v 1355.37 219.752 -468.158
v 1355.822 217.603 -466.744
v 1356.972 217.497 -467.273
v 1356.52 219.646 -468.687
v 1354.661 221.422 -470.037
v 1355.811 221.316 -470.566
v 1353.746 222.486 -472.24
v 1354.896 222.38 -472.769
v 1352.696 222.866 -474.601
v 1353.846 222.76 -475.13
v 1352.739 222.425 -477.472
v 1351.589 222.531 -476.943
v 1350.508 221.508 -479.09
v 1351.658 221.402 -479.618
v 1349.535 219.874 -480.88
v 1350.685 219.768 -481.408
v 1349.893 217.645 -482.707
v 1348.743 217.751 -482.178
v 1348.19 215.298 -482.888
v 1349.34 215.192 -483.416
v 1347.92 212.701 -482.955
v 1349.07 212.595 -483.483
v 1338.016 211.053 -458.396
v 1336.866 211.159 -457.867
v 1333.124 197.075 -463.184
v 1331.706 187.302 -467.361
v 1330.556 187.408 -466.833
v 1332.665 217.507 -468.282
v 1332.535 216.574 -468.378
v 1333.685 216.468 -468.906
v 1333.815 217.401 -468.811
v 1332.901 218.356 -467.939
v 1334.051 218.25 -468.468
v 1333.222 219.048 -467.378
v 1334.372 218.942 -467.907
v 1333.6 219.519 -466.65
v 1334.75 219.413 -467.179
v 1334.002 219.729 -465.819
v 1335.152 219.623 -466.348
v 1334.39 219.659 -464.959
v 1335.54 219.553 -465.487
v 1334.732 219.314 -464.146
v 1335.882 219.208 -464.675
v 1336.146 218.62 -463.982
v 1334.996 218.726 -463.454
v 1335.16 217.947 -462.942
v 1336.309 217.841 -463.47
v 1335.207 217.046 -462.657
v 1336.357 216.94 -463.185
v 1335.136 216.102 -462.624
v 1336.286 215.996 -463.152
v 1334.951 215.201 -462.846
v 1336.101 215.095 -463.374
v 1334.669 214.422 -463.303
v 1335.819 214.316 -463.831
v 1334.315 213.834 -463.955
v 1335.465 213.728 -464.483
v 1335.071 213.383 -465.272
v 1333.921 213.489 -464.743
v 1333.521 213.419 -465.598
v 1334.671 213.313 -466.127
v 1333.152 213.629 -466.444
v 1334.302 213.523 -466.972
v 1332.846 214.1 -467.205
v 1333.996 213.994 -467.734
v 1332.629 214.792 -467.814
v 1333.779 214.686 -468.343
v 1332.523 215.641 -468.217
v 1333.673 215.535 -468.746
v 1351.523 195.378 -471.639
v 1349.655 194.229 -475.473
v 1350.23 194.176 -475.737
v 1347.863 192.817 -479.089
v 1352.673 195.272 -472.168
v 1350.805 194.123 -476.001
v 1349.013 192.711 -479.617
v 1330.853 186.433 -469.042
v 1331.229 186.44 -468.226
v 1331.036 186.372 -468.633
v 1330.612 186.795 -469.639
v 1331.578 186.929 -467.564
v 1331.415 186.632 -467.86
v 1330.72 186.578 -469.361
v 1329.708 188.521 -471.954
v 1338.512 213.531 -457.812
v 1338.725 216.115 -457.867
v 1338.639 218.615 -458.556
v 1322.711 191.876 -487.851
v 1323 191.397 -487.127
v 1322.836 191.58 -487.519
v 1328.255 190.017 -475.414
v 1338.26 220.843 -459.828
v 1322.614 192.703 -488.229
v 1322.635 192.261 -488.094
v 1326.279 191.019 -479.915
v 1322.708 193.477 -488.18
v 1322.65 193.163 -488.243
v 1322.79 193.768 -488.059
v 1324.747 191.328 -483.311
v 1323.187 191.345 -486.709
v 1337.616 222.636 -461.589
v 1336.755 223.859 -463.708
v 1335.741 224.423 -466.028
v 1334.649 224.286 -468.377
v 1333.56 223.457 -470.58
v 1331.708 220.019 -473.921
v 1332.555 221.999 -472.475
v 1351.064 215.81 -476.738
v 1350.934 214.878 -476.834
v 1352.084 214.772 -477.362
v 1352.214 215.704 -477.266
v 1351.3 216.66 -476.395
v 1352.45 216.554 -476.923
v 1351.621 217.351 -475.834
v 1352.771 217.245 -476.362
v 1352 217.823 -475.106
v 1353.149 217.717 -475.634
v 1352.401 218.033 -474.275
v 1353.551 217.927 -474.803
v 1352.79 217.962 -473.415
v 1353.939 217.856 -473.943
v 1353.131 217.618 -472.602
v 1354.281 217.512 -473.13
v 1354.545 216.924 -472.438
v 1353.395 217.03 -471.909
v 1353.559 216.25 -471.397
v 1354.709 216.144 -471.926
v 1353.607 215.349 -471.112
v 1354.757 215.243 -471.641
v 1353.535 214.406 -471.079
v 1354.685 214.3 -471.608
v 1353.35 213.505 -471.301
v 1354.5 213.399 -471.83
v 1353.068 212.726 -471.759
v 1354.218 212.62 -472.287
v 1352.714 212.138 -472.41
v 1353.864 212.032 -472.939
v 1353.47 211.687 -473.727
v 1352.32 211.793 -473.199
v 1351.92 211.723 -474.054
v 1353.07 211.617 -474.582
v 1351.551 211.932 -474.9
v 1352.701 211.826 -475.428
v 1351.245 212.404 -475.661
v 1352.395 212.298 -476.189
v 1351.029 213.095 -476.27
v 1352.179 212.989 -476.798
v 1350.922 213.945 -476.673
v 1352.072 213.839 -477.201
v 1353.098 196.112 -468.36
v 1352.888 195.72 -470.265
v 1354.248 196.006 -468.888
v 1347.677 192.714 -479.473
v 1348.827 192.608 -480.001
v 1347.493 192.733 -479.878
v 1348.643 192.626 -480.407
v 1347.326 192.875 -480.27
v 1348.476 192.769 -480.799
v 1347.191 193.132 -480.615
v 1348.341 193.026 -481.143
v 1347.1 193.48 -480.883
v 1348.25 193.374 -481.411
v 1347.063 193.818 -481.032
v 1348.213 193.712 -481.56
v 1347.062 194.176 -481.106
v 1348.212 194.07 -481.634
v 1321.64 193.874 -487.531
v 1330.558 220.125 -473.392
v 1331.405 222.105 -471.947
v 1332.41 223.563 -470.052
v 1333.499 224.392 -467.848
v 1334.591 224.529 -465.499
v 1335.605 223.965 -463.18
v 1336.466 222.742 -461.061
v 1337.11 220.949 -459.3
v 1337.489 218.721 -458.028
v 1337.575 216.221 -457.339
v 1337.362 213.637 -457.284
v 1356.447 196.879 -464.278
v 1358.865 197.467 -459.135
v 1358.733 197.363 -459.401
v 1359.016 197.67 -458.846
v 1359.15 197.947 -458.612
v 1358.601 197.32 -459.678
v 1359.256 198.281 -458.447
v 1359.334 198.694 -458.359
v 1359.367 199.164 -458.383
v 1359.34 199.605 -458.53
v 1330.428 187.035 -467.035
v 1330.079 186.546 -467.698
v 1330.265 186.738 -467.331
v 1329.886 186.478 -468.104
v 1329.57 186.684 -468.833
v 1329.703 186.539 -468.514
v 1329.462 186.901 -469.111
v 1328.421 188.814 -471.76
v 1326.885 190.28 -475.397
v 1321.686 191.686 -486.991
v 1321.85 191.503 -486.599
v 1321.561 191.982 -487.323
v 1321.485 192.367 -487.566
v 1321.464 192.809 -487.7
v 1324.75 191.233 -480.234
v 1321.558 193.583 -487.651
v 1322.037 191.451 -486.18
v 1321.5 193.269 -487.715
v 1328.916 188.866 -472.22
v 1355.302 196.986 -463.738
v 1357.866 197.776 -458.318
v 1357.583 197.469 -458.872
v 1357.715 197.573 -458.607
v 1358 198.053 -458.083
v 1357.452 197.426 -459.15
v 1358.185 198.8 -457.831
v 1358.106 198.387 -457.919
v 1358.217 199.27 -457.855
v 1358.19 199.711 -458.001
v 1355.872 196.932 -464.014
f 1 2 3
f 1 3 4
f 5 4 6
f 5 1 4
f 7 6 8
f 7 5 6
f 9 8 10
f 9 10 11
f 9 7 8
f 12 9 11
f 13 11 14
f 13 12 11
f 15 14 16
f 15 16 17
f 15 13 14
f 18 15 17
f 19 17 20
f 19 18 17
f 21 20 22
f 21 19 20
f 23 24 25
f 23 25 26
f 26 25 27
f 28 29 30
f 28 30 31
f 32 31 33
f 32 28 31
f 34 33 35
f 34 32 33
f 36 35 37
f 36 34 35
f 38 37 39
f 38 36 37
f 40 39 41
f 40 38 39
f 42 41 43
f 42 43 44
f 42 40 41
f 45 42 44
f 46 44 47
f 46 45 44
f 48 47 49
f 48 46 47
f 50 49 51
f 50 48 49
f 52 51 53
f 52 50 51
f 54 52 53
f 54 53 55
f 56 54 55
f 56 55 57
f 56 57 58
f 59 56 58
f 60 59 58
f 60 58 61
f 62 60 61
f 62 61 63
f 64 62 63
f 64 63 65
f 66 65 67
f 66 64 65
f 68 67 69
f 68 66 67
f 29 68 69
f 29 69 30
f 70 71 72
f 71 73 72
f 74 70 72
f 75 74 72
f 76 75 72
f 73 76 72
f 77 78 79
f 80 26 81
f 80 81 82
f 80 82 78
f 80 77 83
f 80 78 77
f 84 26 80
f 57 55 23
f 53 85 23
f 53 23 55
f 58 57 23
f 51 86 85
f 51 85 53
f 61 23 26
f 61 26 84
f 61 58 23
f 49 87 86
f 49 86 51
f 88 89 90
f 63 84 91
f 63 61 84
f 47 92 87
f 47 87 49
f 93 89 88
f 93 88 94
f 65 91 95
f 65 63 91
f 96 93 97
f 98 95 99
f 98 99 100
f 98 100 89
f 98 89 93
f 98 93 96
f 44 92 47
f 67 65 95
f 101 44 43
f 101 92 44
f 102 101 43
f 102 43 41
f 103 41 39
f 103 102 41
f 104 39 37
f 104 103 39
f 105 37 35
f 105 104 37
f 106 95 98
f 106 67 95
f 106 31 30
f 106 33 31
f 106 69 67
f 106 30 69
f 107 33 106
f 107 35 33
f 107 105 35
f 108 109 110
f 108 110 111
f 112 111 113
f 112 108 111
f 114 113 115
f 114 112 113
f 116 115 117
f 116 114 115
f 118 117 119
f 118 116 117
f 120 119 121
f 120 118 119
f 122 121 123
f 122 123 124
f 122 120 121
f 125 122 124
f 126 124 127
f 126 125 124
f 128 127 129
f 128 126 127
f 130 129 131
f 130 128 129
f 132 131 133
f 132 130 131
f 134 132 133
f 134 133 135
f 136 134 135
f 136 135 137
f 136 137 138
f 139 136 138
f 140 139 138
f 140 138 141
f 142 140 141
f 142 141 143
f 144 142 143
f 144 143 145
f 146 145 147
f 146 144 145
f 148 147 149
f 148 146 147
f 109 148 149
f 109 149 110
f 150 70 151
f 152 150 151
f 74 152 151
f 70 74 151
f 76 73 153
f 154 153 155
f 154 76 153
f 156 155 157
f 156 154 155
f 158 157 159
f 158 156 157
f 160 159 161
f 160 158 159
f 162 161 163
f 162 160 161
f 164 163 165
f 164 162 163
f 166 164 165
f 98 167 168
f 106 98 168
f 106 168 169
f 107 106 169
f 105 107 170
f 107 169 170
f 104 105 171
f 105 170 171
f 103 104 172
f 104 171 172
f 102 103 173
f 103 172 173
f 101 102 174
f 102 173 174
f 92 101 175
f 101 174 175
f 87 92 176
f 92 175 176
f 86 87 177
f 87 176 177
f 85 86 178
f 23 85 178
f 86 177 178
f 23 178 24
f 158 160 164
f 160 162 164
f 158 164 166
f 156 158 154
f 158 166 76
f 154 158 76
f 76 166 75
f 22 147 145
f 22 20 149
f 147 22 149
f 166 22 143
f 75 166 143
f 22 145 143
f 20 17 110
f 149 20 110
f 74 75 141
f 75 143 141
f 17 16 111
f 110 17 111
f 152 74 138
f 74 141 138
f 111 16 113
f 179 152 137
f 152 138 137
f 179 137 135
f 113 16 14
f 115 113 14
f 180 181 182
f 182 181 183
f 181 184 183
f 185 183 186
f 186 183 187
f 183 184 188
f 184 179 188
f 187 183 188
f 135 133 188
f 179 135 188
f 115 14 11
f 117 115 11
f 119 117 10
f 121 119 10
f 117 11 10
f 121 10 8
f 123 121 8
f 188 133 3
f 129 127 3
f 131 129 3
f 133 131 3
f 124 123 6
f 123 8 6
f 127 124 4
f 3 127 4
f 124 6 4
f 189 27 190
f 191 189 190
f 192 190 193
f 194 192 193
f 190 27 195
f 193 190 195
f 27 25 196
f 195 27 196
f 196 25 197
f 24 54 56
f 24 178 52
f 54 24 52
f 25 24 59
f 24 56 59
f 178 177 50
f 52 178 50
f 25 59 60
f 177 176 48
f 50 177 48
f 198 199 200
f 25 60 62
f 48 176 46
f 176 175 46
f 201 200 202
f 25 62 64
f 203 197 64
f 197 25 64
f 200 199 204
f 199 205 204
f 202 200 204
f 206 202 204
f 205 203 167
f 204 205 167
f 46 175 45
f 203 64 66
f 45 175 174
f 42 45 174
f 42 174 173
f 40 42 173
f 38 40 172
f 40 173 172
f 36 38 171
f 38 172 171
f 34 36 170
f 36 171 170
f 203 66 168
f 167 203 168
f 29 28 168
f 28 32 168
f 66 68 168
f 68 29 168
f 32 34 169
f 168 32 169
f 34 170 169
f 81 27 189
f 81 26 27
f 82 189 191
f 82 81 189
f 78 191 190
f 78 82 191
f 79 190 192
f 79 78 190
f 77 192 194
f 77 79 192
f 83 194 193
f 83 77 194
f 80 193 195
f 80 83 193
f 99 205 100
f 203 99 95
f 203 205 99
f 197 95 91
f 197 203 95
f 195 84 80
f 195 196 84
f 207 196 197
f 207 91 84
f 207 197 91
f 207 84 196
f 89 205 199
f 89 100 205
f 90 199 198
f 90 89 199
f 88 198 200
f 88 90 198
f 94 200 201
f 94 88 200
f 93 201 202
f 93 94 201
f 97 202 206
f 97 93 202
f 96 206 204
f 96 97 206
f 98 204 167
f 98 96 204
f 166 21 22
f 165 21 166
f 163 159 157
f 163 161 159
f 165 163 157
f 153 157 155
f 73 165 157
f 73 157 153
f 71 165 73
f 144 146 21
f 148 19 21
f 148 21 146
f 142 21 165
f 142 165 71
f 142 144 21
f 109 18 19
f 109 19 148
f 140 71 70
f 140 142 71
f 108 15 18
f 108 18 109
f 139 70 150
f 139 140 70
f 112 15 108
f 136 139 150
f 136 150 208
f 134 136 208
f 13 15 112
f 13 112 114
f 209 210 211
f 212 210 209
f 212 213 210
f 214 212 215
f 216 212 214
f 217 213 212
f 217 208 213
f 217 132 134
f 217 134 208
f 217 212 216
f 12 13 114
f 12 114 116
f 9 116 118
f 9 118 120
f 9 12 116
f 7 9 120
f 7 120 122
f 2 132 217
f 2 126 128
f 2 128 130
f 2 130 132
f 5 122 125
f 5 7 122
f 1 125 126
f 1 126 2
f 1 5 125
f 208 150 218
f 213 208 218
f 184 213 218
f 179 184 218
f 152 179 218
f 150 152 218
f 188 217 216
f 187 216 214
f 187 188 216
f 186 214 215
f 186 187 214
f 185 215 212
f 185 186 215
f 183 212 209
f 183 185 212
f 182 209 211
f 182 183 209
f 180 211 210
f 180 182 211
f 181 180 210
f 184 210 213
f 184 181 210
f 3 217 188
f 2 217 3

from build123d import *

# Parameters (mm, degrees)
SKETCH2_R            = 3.175
BASE_FLANGE1_DEPTH   = 1.27
BASE_FLANGE2_START   = -1.27
SKETCH3_R            = 3.175
BASE_FLANGE2_DEPTH   = 1.27
CUT_EXTRUDE1_START   = 1383.390590681
CUT_EXTRUDE1_DEPTH   = 21.59
CUT_EXTRUDE1_START_2 = 1403.710590681
CUT_EXTRUDE1_2_DEPTH = 1.27
FILLET1_R            = 1.5875
FILLET2_R            = 1.5875


# Read off the part's stored shape, not the designer's step: Cut-Extrude1
# Sheet-metal steps are written as plain solids
with BuildPart() as part:
    # Sketch2 → Base-Flange1 (new body)
    with BuildSketch(Plane(origin=(1271.017200109, -117.186128876, -584.111385454), x_dir=(-0.41343144837747287, 0.048074727094114526, -0.9092652297912482), z_dir=(0.9054695523042622, -0.08348311229805495, -0.4161195258708122))):
        with BuildLine():
            Line((-111.741539823, 304.685096578), (-142.590441512, 312.195606854))
            Line((-142.590441512, 312.195606854), (-125.683734865, 342.423547719))
            ThreePointArc((-125.683734865, 342.423547719), (-114.423324415, 346.831514257), (-107.913283545, 336.641009835))
            Line((-107.913283545, 336.641009835), (-111.741539823, 304.685096578))
        make_face()
        with Locations(Location((-117.791498951, 339.304688334, 0), (0, 0, 357.234798667))):
            Circle(SKETCH2_R, mode=Mode.SUBTRACT)
    extrude(amount=BASE_FLANGE1_DEPTH)


with BuildPart() as body_2:
    # Sketch3 → Base-Flange2 (new body)
    with BuildSketch(Plane(origin=(1253.768005138, -115.595775587, -576.184308486), x_dir=(-0.41343144837747287, 0.048074727094114526, -0.9092652297912482), z_dir=(0.9054695523042622, -0.08348311229805495, -0.4161195258708122)).offset(BASE_FLANGE2_START)):
        with BuildLine():
            Line((-114.826429992, 305.436147605), (-83.977528304, 297.925637329))
            Line((-83.977528304, 297.925637329), (-109.072885328, 342.450794137))
            ThreePointArc((-109.072885328, 342.450794137), (-121.469860523, 346.371786734), (-126.228340332, 334.271536867))
            Line((-126.228340332, 334.271536867), (-114.826429992, 305.436147605))
        make_face()
        with Locations(Location((-117.791498951, 339.304688334, 0), (0, 0, 357.234798667))):
            Circle(SKETCH3_R, mode=Mode.SUBTRACT)
    extrude(amount=BASE_FLANGE2_DEPTH)


with BuildPart() as cut_extrude1_tool:
    # Cut-Extrude1 outline → Cut-Extrude1 (new body)
    with BuildSketch(Plane(origin=(0, 0, 0), x_dir=(0.07585621579403598, 0.996509192110655, -0.034860644922007814), z_dir=(0.9054695523042622, -0.08348311229805501, -0.4161195258708122)).offset(CUT_EXTRUDE1_START)):
        with BuildLine():
            Line((301.620270259, 130.368525756), (313.659534542, 135.814514494))
            add(Edge.make_bspline(
                [(314.39563609, 139.451923084), (314.080178625, 137.620550007), (313.659534542, 135.814514494)],
                knots=[4.667621379, 4.667621379, 4.667621379, 4.798627184, 4.798627184, 4.798627184], degree=2, weights=[1, 0.991421278, 0.987108427]))
            add(Edge.make_bspline(
                [(315.765923985, 152.105599478), (315.778536243, 145.923297426), (314.39563609, 139.451923084)],
                knots=[4.300161202, 4.300161202, 4.300161202, 4.757156582, 4.757156582, 4.757156582], degree=2, weights=[1, 0.974007789, 1]))
            Line((315.765923985, 152.105599478), (304.953083323, 157.485707038))
            Line((304.953083323, 157.485707038), (299.540917585, 129.427925817))
            Line((299.540917585, 129.427925817), (293.527400097, 98.25261335))
            Line((293.527400097, 98.25261335), (307.840240712, 107.256042799))
            add(Edge.make_bspline(
                [(307.840240712, 107.256042799), (308.18810541, 111.397419869), (308.183888711, 115.675478714), (307.714650854, 119.739298085), (306.758436434, 123.198741783), (304.833094177, 127.168835045), (304.108187458, 128.292843046), (303.317163588, 129.197719216), (302.481286055, 129.885010912), (301.620270259, 130.368525756)],
                knots=[3.684656994, 3.684656994, 3.684656994, 3.684656994, 3.684656994, 3.684656994, 4.476569223, 4.476569223, 4.476569223, 4.476569223, 4.872364489, 4.872364489, 4.872364489, 4.872364489, 4.872364489, 4.872364489], degree=5, weights=[1, 1, 0.997972732, 0.997583217, 1, 1, 0.999902079, 0.999924912, 1, 1]))
        make_face()
    extrude(amount=CUT_EXTRUDE1_DEPTH)


with BuildPart() as part_1:
    add(part.part)

    # Cut-Extrude1: cut by cut_extrude1_tool
    add(cut_extrude1_tool.part, mode=Mode.SUBTRACT)

    # Cut-Extrude1 2 outline → Cut-Extrude1 2 (cut)
    with BuildSketch(Plane(origin=(0, 0, 0), x_dir=(0.07585621579403598, 0.996509192110655, -0.034860644922007814), z_dir=(0.9054695523042622, -0.08348311229805501, -0.4161195258708122)).offset(CUT_EXTRUDE1_START_2)):
        with BuildLine():
            Line((313.659534542, 135.814514494), (301.620270259, 130.368525756))
            add(Edge.make_bspline(
                [(301.620270259, 130.368525756), (303.903052509, 129.086599093), (305.474701099, 125.845829066)],
                knots=[3.288861728, 3.288861728, 3.288861728, 3.684656994, 3.684656994, 3.684656994], degree=2, weights=[1, 0.942945604, 0.92391717]))
            Line((305.474701099, 125.845829066), (310.2442301, 125.506775846))
            add(Edge.make_bspline(
                [(313.659534542, 135.814514494), (312.365699462, 130.259433149), (310.2442301, 125.506775846)],
                knots=[4.798627184, 4.798627184, 4.798627184, 5.194530174, 5.194530174, 5.194530174], degree=2, weights=[0.987108427, 0.974074877, 1]))
        make_face()
    extrude(amount=CUT_EXTRUDE1_2_DEPTH, mode=Mode.SUBTRACT)

    # Fillet1
    fillet1_edges = [part_1.edges().sort_by_distance(p)[0] for p in [
        (1359.060812848, 197.424505154, -457.173973401),
        (1347.534895545, 191.922086442, -481.150277132),
    ]]
    fillet(fillet1_edges, radius=FILLET1_R)


with BuildPart() as body_2_1:
    add(body_2.part)

    # Cut-Extrude1: cut by cut_extrude1_tool
    add(cut_extrude1_tool.part, mode=Mode.SUBTRACT)

    # Fillet2
    fillet2_edges = [body_2_1.edges().sort_by_distance(p)[0] for p in [
        (1321.33230656, 191.222865761, -489.194296195),
        (1330.511729235, 185.02460803, -467.976504101),
    ]]
    fillet(fillet2_edges, radius=FILLET2_R)


solid = Compound([part_1.part, body_2_1.part])
